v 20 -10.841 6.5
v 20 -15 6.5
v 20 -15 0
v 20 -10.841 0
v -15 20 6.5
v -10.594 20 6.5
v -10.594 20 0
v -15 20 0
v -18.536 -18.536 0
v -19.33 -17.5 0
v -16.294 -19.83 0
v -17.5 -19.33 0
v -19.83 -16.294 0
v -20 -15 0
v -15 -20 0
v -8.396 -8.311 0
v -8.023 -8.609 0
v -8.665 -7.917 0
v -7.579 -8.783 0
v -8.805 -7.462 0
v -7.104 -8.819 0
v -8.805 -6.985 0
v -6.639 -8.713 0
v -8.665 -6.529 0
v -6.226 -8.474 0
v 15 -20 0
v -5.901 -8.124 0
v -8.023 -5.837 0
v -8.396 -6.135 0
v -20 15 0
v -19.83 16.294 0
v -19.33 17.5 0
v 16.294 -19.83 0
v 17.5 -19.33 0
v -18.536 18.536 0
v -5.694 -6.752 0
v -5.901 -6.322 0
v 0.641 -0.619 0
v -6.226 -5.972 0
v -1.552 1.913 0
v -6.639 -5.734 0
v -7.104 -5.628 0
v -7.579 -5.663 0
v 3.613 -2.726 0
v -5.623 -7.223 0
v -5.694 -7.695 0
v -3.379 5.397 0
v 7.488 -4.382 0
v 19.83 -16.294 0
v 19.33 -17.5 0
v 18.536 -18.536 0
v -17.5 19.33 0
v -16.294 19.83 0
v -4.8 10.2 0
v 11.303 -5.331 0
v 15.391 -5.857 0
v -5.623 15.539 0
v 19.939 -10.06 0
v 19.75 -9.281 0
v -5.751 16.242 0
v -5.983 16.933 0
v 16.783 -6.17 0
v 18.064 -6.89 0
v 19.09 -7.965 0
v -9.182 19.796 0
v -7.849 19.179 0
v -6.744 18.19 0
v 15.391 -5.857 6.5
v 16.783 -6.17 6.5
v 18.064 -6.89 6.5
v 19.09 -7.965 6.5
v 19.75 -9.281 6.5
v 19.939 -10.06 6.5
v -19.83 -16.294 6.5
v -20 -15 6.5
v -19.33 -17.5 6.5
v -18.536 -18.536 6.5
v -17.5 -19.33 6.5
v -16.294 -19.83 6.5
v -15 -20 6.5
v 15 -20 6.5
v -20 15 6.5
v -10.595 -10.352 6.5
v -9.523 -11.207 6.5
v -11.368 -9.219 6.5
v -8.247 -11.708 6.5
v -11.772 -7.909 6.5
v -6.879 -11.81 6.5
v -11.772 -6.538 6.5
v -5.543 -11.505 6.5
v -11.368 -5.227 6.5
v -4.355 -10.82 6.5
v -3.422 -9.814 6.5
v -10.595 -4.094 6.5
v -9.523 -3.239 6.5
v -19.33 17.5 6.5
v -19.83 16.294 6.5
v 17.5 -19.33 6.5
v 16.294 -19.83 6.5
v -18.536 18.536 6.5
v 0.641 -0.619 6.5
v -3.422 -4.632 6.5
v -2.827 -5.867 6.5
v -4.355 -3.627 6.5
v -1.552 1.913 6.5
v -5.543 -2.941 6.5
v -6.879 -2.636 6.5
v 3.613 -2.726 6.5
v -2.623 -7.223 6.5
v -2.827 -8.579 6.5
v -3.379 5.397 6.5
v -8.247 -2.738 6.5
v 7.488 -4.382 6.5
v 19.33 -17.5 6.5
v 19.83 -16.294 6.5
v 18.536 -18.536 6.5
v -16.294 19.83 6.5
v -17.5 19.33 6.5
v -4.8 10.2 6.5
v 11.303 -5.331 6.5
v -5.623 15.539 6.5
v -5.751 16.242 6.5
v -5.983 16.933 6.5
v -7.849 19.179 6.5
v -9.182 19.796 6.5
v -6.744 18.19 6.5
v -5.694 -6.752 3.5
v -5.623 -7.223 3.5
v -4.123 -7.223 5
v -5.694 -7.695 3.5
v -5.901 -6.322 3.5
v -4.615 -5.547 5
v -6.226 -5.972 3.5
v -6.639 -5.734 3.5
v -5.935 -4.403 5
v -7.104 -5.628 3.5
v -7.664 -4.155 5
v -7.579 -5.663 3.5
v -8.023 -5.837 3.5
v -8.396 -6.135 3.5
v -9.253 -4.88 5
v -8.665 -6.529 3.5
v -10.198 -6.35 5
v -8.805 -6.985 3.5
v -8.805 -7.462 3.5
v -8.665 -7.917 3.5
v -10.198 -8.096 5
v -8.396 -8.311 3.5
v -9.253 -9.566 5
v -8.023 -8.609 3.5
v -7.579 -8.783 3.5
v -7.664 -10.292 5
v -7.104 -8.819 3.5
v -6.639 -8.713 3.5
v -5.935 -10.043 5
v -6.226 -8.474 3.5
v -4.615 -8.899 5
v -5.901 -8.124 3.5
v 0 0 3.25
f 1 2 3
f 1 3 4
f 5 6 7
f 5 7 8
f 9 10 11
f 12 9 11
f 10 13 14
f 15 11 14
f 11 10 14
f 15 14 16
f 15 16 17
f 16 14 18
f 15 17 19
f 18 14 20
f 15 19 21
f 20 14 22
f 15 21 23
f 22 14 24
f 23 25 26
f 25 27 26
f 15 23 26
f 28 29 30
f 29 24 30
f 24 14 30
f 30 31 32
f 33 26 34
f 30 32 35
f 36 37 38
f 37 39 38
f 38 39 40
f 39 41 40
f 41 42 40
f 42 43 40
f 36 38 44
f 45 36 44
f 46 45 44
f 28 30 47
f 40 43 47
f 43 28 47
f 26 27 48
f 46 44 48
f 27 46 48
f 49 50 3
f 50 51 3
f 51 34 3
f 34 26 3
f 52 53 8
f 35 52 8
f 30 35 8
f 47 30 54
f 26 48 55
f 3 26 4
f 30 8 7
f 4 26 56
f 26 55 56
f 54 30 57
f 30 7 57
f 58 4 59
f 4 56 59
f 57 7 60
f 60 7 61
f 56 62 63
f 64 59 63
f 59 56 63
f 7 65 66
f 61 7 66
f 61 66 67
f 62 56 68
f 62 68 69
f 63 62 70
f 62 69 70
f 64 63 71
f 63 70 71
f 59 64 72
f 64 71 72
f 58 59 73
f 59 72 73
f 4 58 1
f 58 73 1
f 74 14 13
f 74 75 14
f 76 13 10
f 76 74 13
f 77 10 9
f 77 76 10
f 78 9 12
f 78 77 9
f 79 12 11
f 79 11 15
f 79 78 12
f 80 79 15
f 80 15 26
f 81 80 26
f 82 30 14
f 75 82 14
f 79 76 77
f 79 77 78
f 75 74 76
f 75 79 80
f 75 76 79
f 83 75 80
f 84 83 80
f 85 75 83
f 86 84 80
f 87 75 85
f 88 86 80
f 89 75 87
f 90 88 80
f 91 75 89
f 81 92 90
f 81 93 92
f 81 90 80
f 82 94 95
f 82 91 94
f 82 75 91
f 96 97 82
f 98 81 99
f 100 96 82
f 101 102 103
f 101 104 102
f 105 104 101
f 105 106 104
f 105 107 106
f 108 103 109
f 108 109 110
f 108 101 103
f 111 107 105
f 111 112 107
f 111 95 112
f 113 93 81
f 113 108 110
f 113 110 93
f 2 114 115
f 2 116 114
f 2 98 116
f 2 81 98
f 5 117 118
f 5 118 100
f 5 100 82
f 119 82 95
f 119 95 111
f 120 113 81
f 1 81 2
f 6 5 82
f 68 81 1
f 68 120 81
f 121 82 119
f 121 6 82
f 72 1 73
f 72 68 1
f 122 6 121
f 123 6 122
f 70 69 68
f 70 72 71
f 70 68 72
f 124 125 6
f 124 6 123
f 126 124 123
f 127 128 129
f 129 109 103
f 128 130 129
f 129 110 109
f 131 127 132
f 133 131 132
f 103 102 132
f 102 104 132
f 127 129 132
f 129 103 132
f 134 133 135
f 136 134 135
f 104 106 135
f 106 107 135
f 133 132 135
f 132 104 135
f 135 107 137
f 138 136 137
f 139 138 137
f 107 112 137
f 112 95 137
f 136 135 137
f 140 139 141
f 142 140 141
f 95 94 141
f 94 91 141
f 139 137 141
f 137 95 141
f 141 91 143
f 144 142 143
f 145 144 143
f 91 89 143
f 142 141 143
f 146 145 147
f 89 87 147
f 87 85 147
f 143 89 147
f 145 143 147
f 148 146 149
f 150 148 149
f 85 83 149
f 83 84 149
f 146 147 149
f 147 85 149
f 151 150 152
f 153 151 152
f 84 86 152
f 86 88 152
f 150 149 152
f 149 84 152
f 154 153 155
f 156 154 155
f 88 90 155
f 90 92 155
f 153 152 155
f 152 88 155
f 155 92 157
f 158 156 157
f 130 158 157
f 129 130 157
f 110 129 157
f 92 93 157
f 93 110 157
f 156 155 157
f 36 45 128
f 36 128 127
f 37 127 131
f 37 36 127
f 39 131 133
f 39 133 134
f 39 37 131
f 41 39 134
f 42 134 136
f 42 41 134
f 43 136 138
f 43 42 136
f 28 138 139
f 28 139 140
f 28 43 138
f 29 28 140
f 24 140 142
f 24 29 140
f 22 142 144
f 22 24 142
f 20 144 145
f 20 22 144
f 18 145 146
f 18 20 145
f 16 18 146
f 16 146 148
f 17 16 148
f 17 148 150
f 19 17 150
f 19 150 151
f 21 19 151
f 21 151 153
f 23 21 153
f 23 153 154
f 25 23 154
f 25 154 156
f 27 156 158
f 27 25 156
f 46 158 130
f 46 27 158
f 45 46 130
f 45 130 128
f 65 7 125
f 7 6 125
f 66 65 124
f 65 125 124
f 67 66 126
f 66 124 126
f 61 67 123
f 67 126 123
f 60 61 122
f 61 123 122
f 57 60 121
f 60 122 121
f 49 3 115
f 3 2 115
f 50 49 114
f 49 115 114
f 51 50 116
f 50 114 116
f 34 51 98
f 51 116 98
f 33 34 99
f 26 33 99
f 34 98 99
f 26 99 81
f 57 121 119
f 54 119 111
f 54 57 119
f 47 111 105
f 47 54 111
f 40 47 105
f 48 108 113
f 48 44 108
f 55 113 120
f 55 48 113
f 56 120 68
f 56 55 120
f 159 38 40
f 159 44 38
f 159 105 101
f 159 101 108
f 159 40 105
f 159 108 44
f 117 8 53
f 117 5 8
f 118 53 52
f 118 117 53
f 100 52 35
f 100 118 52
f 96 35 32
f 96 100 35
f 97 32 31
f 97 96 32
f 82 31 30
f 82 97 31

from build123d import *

# Parameters (mm, degrees)
F1_R     = 1.6
F2_DEPTH = 6.5
F3_SIZE  = 3
F4_R     = 5


with BuildPart() as f2:
    # F1 (on Top) → F2 (new body)
    with BuildSketch(Plane.XY):
        with BuildLine():
            Line((-6, 20), (-20, 20))
            Line((-20, 20), (-20, -20))
            Line((-20, -20), (20, -20))
            Line((20, -20), (20, -6))
            add(Edge.make_bspline(
                [(-6, 20), (-5.4739157377, 12.0071208998), (-3.301555689, -2.9531264796), (12.0770271157, -6.1008679405), (20, -6)],
                knots=[0, 0, 0, 0, 0.5, 1, 1, 1, 1], degree=3))
        make_face()
        with Locations((-7.2231281083, -7.2231281083)):
            Circle(F1_R, mode=Mode.SUBTRACT)
    extrude(amount=F2_DEPTH)

    # F3
    f3_edges = [f2.edges().sort_by_distance(p)[0] for p in [
        (-8.823128, -7.223128, 6.5),
    ]]
    chamfer(f3_edges, length=F3_SIZE)

    # F4
    f4_edges = [f2.edges().sort_by_distance(p)[0] for p in [
        (-20, -20, 3.25),
        (20, -20, 3.25),
        (20, -6, 3.25),
        (-20, 20, 3.25),
        (-6, 20, 3.25),
    ]]
    fillet(f4_edges, radius=F4_R)


solid = f2.part
